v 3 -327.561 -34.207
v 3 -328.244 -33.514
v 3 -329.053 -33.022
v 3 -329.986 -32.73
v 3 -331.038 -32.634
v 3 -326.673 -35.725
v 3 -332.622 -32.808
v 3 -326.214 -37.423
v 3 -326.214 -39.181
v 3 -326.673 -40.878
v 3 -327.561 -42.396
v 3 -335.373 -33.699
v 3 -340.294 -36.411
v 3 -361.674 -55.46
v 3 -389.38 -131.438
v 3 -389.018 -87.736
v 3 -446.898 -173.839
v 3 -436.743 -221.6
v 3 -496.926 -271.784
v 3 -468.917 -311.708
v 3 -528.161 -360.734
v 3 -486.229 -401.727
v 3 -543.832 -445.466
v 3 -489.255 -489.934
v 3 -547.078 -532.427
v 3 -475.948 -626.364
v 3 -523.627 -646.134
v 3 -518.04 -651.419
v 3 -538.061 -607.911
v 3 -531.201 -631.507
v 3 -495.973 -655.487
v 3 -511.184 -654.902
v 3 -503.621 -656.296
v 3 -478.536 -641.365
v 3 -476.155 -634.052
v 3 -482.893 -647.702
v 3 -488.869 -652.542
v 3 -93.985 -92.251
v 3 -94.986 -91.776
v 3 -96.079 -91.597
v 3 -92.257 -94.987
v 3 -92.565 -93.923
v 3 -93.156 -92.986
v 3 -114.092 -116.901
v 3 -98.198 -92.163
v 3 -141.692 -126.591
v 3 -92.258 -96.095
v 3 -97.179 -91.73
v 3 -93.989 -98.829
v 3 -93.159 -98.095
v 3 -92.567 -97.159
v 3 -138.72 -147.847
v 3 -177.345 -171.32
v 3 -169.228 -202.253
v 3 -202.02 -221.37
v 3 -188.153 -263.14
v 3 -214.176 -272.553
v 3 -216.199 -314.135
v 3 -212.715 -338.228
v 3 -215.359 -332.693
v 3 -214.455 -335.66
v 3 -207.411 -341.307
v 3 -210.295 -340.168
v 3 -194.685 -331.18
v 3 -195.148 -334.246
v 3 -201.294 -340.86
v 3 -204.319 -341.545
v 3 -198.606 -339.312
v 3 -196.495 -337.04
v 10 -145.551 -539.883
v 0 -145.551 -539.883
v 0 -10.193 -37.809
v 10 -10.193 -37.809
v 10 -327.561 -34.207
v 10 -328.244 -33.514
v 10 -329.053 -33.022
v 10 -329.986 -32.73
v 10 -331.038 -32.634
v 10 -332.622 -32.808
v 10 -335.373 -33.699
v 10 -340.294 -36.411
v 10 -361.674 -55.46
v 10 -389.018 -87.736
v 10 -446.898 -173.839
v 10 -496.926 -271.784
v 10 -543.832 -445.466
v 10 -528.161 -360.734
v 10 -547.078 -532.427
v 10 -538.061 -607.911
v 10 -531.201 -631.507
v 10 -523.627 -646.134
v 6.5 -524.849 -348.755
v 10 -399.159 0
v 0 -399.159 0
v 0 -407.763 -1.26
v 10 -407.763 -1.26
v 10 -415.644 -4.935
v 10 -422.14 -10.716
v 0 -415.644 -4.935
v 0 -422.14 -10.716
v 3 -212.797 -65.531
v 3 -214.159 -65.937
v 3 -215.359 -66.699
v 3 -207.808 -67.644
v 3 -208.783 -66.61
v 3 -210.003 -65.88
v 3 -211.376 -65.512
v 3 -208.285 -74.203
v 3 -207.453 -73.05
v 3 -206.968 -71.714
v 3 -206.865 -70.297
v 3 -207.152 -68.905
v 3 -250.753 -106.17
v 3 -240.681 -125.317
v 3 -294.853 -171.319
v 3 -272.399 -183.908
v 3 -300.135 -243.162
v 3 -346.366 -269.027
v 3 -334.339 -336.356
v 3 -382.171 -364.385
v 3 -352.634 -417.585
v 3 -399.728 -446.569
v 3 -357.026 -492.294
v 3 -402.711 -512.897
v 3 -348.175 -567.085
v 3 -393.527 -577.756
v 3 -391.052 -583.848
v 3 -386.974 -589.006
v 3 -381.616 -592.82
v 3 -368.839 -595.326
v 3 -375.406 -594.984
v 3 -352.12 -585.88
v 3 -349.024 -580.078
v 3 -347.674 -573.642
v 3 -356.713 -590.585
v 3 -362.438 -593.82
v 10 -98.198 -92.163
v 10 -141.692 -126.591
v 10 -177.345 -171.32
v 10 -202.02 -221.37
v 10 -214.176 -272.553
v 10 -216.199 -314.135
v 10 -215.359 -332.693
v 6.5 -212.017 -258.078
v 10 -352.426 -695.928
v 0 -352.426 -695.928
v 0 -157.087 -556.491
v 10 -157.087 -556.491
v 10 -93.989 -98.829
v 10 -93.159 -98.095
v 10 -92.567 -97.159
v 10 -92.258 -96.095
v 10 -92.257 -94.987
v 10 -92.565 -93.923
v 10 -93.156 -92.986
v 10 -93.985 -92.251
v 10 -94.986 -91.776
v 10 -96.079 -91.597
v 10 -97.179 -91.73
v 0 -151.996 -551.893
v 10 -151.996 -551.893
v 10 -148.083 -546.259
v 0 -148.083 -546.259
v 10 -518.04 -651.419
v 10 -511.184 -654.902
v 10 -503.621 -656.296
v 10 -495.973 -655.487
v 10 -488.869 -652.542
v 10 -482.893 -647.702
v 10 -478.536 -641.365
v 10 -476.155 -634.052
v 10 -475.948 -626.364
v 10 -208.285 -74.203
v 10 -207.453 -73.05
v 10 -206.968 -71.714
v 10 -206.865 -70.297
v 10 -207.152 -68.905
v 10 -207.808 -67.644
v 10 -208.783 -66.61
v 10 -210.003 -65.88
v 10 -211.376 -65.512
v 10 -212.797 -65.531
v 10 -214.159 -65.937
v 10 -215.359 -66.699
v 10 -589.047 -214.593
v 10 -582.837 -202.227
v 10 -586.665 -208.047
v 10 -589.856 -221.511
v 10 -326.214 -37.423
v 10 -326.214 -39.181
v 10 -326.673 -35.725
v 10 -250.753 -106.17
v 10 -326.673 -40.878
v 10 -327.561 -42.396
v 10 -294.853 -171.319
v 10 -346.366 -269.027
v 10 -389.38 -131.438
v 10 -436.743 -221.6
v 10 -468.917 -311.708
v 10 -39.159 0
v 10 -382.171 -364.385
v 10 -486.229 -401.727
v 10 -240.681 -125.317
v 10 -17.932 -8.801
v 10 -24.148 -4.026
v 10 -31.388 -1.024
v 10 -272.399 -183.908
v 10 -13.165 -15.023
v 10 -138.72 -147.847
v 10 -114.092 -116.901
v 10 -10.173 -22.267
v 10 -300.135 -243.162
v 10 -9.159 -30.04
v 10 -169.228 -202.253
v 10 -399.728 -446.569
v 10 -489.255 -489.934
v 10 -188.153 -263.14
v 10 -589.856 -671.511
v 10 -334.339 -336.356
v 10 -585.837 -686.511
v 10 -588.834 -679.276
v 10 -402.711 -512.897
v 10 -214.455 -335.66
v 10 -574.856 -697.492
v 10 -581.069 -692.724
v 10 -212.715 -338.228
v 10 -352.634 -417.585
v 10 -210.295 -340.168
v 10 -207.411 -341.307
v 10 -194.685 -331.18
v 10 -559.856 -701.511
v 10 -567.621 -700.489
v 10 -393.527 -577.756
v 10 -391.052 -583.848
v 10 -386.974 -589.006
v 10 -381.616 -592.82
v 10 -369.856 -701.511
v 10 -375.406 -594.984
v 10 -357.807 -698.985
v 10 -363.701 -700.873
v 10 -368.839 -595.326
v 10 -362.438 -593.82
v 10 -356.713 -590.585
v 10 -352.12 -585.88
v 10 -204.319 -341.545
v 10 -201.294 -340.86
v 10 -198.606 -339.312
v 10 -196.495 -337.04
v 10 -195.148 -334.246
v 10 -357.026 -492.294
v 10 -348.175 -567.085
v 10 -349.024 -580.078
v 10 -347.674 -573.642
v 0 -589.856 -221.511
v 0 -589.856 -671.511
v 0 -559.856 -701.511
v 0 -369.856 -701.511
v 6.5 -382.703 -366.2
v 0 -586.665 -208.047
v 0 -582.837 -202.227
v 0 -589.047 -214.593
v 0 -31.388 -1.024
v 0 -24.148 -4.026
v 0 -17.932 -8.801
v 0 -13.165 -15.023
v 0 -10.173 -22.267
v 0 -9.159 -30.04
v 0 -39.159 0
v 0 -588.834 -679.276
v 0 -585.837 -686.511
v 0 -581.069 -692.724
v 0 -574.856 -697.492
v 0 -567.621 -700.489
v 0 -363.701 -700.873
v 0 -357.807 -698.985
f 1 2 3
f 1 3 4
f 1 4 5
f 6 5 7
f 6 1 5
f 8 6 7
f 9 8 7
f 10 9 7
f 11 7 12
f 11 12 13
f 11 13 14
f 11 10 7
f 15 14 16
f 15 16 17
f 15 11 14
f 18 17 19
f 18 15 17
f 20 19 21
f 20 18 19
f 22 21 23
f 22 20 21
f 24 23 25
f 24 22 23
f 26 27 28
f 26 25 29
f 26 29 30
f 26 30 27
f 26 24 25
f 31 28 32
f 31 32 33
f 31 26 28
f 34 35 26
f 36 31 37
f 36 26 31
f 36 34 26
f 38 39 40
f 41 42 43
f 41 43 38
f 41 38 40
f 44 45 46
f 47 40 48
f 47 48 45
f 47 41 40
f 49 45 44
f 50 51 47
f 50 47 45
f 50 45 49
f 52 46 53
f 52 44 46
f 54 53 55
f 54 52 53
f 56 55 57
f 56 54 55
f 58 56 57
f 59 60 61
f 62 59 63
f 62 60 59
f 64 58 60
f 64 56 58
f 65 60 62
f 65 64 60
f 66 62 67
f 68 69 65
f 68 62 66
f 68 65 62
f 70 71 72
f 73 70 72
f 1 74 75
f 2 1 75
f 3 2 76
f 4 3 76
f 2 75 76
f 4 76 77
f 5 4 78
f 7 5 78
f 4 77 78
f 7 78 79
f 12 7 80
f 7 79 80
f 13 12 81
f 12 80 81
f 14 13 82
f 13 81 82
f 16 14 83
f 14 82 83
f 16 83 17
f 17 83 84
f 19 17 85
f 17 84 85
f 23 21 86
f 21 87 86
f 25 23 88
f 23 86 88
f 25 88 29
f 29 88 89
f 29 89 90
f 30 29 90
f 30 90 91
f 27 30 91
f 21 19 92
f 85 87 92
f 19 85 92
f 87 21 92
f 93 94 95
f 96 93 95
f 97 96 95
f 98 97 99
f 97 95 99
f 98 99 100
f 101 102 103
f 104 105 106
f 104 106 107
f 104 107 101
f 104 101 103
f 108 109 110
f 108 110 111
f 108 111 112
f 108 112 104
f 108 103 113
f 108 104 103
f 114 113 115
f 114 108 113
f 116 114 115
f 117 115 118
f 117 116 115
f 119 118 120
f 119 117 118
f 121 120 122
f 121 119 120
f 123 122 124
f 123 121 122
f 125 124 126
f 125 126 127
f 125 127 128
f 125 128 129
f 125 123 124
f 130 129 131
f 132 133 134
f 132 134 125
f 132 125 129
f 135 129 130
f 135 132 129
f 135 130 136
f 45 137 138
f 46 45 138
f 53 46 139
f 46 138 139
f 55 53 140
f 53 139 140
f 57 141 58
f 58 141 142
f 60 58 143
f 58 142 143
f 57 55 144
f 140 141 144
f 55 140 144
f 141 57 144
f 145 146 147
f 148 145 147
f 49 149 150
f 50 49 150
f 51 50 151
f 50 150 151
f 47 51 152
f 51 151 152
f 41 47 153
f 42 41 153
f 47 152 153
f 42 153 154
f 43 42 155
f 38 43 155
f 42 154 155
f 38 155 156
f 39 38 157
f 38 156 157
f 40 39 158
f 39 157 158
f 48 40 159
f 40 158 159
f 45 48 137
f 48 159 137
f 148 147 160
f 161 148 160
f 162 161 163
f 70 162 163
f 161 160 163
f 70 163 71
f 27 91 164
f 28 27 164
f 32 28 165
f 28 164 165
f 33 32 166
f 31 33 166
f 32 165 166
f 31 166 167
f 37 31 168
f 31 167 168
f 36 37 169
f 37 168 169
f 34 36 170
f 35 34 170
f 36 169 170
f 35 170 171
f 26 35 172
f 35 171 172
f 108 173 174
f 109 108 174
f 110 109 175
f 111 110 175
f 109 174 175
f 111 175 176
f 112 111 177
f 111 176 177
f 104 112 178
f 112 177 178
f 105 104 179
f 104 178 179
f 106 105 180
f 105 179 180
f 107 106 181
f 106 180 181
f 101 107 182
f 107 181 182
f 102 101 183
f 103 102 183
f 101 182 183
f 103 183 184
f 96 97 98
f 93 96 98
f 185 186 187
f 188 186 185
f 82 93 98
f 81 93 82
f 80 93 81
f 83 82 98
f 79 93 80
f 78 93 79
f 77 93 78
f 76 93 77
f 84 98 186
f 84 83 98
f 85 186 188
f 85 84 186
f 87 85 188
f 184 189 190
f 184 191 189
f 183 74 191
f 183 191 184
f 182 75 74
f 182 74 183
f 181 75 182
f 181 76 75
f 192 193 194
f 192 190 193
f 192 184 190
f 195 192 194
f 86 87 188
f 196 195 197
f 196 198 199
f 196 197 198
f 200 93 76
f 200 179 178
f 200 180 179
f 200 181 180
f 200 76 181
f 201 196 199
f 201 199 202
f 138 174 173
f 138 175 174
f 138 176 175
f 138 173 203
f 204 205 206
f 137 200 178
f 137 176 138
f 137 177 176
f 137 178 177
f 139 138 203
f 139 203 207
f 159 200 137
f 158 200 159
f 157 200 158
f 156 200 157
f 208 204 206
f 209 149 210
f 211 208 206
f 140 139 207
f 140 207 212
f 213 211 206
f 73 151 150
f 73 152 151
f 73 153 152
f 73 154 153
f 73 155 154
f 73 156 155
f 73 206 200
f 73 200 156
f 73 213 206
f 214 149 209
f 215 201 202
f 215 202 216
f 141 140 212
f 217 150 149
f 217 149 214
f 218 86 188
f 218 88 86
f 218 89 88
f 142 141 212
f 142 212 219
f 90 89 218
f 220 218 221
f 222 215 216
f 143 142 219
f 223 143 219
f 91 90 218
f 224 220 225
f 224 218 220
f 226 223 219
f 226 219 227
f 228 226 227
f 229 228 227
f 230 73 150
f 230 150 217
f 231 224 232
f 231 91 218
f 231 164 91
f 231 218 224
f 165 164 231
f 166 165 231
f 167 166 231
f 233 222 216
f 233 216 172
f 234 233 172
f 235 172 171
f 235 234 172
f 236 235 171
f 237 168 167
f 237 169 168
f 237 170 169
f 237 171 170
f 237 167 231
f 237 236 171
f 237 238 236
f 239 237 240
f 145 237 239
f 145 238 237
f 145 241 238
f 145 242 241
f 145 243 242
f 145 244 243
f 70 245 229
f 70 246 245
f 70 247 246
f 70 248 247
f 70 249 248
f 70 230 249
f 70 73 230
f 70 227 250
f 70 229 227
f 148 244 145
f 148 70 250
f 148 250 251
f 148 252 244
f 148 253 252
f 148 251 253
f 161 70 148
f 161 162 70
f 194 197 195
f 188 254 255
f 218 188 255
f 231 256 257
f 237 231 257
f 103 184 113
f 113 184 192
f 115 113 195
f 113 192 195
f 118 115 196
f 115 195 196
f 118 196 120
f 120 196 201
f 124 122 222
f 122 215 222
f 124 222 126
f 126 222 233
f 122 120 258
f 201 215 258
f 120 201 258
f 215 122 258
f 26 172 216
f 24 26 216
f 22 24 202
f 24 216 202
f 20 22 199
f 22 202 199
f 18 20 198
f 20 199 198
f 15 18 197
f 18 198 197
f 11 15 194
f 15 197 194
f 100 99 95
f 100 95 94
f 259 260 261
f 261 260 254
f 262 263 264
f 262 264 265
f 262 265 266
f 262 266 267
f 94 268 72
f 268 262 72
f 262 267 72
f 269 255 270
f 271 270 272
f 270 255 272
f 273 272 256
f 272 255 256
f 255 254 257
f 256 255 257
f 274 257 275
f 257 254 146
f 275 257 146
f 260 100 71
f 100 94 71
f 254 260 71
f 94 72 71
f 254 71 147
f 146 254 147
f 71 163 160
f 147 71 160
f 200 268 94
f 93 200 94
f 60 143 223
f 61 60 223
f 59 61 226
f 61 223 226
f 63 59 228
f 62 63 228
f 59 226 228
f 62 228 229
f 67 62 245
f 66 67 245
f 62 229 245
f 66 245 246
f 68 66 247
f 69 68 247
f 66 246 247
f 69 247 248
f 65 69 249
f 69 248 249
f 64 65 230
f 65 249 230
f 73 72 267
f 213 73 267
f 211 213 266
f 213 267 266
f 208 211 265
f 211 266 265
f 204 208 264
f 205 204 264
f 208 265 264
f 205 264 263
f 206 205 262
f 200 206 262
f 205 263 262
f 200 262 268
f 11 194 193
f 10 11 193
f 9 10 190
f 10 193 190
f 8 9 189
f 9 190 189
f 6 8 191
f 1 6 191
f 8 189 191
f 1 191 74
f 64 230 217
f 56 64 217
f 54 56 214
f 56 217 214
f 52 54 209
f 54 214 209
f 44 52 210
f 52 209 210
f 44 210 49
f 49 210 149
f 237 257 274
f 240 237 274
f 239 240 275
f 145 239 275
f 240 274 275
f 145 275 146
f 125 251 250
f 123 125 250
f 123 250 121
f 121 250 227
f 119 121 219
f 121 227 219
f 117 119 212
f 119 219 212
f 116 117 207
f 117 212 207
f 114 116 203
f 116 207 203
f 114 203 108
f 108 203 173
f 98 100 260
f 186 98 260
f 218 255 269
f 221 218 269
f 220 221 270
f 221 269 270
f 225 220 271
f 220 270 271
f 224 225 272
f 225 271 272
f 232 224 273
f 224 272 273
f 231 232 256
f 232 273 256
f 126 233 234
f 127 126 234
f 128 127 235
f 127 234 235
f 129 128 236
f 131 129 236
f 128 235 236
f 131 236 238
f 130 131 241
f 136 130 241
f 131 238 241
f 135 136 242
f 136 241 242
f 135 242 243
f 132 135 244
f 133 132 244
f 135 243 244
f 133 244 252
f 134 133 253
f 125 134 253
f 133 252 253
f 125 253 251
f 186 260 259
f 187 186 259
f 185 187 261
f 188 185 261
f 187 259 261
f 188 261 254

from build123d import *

# Parameters (mm, degrees)
BOSS_EXTRUDE1_DEPTH = 10
CUT_EXTRUDE2_DEPTH  = 7


with BuildPart() as part:
    # Sketch1 → Boss-Extrude1 (new body)
    with BuildSketch(Plane(origin=(0, 0, 0), x_dir=(0, 0, -1), z_dir=(1, 0, 0))):
        with BuildLine():
            Line((0, -39.159060238), (0, -399.159060238))
            ThreePointArc((0, -399.159060238), (2.810766389, -411.83760809), (10.716371709, -422.140393531))
            Line((10.716371709, -422.140393531), (202.227482489, -582.837295953))
            ThreePointArc((202.227482489, -582.837295953), (211.25050648, -588.046741283), (221.51111078, -589.855962659))
            Line((221.51111078, -589.855962659), (671.51111078, -589.855962659))
            ThreePointArc((671.51111078, -589.855962659), (692.724314215, -581.069166095), (701.51111078, -559.855962659))
            Line((701.51111078, -559.855962659), (701.51111078, -369.855962659))
            ThreePointArc((701.51111078, -369.855962659), (700.081380744, -360.705024227), (695.928465834, -352.426310564))
            Line((695.928465834, -352.426310564), (556.491249073, -157.087470131))
            ThreePointArc((556.491249073, -157.087470131), (549.188422732, -149.877866821), (539.883012979, -145.551320648))
            Line((539.883012979, -145.551320648), (37.809118961, -10.19325866))
            ThreePointArc((37.809118961, -10.19325866), (11.755460664, -15.344426409), (0, -39.159060238))
        make_face()
    extrude(amount=BOSS_EXTRUDE1_DEPTH)

    # Sketch4 → Cut-Extrude2 (cut)
    with BuildSketch(Plane(origin=(10, 0, 0), x_dir=(0, 0, -1), z_dir=(1, 0, 0))):
        with BuildLine():
            ThreePointArc((646.133694128, -523.626722446), (654.270375926, -492.315038086), (626.364411935, -475.947865394))
            add(Edge.make_bspline(
                [(626.364411935, -475.947865394), (572.427382245, -482.279425386), (369.496171973, -510.067463814), (179.998241324, -434.657283692), (42.396217675, -327.560917886)],
                knots=[0, 0, 0, 0, 0.257311007, 1, 1, 1, 1], degree=3))
            ThreePointArc((42.396217675, -327.560917886), (38.301805286, -326.1553415), (34.207392898, -327.560917886))
            add(Edge.make_bspline(
                [(34.207392898, -327.560917886), (14.475713482, -342.918185901), (324.808789115, -589.015611509), (620.265200397, -544.090123727), (646.133694128, -523.626722446)],
                knots=[0, 0, 0, 0, 0.545719307, 1, 1, 1, 1], degree=3))
        make_face()
        with BuildLine():
            ThreePointArc((332.693478174, -215.359019498), (341.545058852, -204.318697463), (331.179728441, -194.685467652))
            add(Edge.make_bspline(
                [(331.179728441, -194.685467652), (300.184384568, -194.688304583), (192.730208888, -182.13783781), (112.622758483, -114.88285895), (98.829146805, -93.988930122)],
                knots=[0, 0, 0, 0, 0.339117248, 1, 1, 1, 1], degree=3))
            ThreePointArc((98.829146805, -93.988930122), (93.433821546, -92.827514339), (92.163413905, -98.198220596))
            add(Edge.make_bspline(
                [(92.163413905, -98.198220596), (126.325036043, -154.802617957), (226.918714052, -224.562098265), (331.921739283, -215.472572374), (332.693478174, -215.359019498)],
                knots=[0, 0, 0, 0, 0.645739259, 1, 1, 1, 1], degree=3))
        make_face()
        with BuildLine():
            ThreePointArc((74.202765192, -208.284508838), (67.092959072, -208.260098077), (66.698936736, -215.359019498))
            add(Edge.make_bspline(
                [(66.698936736, -215.359019498), (100.320017518, -254.957400328), (300.322217315, -390.035120939), (509.639726303, -410.500517765), (577.755509271, -393.526935767)],
                knots=[0, 0, 0, 0, 0.654710405, 1, 1, 1, 1], degree=3))
            ThreePointArc((577.755509271, -393.526935767), (594.800287265, -365.58541059), (567.085033992, -348.175125638))
            add(Edge.make_bspline(
                [(567.085033992, -348.175125638), (526.742508558, -357.109499901), (316.076431581, -369.790908175), (81.149231878, -214.924232147), (74.202765192, -208.284508838)],
                knots=[0, 0, 0, 0, 0.231564943, 1, 1, 1, 1], degree=3))
        make_face()
    extrude(amount=-CUT_EXTRUDE2_DEPTH, mode=Mode.SUBTRACT)


solid = part.part
